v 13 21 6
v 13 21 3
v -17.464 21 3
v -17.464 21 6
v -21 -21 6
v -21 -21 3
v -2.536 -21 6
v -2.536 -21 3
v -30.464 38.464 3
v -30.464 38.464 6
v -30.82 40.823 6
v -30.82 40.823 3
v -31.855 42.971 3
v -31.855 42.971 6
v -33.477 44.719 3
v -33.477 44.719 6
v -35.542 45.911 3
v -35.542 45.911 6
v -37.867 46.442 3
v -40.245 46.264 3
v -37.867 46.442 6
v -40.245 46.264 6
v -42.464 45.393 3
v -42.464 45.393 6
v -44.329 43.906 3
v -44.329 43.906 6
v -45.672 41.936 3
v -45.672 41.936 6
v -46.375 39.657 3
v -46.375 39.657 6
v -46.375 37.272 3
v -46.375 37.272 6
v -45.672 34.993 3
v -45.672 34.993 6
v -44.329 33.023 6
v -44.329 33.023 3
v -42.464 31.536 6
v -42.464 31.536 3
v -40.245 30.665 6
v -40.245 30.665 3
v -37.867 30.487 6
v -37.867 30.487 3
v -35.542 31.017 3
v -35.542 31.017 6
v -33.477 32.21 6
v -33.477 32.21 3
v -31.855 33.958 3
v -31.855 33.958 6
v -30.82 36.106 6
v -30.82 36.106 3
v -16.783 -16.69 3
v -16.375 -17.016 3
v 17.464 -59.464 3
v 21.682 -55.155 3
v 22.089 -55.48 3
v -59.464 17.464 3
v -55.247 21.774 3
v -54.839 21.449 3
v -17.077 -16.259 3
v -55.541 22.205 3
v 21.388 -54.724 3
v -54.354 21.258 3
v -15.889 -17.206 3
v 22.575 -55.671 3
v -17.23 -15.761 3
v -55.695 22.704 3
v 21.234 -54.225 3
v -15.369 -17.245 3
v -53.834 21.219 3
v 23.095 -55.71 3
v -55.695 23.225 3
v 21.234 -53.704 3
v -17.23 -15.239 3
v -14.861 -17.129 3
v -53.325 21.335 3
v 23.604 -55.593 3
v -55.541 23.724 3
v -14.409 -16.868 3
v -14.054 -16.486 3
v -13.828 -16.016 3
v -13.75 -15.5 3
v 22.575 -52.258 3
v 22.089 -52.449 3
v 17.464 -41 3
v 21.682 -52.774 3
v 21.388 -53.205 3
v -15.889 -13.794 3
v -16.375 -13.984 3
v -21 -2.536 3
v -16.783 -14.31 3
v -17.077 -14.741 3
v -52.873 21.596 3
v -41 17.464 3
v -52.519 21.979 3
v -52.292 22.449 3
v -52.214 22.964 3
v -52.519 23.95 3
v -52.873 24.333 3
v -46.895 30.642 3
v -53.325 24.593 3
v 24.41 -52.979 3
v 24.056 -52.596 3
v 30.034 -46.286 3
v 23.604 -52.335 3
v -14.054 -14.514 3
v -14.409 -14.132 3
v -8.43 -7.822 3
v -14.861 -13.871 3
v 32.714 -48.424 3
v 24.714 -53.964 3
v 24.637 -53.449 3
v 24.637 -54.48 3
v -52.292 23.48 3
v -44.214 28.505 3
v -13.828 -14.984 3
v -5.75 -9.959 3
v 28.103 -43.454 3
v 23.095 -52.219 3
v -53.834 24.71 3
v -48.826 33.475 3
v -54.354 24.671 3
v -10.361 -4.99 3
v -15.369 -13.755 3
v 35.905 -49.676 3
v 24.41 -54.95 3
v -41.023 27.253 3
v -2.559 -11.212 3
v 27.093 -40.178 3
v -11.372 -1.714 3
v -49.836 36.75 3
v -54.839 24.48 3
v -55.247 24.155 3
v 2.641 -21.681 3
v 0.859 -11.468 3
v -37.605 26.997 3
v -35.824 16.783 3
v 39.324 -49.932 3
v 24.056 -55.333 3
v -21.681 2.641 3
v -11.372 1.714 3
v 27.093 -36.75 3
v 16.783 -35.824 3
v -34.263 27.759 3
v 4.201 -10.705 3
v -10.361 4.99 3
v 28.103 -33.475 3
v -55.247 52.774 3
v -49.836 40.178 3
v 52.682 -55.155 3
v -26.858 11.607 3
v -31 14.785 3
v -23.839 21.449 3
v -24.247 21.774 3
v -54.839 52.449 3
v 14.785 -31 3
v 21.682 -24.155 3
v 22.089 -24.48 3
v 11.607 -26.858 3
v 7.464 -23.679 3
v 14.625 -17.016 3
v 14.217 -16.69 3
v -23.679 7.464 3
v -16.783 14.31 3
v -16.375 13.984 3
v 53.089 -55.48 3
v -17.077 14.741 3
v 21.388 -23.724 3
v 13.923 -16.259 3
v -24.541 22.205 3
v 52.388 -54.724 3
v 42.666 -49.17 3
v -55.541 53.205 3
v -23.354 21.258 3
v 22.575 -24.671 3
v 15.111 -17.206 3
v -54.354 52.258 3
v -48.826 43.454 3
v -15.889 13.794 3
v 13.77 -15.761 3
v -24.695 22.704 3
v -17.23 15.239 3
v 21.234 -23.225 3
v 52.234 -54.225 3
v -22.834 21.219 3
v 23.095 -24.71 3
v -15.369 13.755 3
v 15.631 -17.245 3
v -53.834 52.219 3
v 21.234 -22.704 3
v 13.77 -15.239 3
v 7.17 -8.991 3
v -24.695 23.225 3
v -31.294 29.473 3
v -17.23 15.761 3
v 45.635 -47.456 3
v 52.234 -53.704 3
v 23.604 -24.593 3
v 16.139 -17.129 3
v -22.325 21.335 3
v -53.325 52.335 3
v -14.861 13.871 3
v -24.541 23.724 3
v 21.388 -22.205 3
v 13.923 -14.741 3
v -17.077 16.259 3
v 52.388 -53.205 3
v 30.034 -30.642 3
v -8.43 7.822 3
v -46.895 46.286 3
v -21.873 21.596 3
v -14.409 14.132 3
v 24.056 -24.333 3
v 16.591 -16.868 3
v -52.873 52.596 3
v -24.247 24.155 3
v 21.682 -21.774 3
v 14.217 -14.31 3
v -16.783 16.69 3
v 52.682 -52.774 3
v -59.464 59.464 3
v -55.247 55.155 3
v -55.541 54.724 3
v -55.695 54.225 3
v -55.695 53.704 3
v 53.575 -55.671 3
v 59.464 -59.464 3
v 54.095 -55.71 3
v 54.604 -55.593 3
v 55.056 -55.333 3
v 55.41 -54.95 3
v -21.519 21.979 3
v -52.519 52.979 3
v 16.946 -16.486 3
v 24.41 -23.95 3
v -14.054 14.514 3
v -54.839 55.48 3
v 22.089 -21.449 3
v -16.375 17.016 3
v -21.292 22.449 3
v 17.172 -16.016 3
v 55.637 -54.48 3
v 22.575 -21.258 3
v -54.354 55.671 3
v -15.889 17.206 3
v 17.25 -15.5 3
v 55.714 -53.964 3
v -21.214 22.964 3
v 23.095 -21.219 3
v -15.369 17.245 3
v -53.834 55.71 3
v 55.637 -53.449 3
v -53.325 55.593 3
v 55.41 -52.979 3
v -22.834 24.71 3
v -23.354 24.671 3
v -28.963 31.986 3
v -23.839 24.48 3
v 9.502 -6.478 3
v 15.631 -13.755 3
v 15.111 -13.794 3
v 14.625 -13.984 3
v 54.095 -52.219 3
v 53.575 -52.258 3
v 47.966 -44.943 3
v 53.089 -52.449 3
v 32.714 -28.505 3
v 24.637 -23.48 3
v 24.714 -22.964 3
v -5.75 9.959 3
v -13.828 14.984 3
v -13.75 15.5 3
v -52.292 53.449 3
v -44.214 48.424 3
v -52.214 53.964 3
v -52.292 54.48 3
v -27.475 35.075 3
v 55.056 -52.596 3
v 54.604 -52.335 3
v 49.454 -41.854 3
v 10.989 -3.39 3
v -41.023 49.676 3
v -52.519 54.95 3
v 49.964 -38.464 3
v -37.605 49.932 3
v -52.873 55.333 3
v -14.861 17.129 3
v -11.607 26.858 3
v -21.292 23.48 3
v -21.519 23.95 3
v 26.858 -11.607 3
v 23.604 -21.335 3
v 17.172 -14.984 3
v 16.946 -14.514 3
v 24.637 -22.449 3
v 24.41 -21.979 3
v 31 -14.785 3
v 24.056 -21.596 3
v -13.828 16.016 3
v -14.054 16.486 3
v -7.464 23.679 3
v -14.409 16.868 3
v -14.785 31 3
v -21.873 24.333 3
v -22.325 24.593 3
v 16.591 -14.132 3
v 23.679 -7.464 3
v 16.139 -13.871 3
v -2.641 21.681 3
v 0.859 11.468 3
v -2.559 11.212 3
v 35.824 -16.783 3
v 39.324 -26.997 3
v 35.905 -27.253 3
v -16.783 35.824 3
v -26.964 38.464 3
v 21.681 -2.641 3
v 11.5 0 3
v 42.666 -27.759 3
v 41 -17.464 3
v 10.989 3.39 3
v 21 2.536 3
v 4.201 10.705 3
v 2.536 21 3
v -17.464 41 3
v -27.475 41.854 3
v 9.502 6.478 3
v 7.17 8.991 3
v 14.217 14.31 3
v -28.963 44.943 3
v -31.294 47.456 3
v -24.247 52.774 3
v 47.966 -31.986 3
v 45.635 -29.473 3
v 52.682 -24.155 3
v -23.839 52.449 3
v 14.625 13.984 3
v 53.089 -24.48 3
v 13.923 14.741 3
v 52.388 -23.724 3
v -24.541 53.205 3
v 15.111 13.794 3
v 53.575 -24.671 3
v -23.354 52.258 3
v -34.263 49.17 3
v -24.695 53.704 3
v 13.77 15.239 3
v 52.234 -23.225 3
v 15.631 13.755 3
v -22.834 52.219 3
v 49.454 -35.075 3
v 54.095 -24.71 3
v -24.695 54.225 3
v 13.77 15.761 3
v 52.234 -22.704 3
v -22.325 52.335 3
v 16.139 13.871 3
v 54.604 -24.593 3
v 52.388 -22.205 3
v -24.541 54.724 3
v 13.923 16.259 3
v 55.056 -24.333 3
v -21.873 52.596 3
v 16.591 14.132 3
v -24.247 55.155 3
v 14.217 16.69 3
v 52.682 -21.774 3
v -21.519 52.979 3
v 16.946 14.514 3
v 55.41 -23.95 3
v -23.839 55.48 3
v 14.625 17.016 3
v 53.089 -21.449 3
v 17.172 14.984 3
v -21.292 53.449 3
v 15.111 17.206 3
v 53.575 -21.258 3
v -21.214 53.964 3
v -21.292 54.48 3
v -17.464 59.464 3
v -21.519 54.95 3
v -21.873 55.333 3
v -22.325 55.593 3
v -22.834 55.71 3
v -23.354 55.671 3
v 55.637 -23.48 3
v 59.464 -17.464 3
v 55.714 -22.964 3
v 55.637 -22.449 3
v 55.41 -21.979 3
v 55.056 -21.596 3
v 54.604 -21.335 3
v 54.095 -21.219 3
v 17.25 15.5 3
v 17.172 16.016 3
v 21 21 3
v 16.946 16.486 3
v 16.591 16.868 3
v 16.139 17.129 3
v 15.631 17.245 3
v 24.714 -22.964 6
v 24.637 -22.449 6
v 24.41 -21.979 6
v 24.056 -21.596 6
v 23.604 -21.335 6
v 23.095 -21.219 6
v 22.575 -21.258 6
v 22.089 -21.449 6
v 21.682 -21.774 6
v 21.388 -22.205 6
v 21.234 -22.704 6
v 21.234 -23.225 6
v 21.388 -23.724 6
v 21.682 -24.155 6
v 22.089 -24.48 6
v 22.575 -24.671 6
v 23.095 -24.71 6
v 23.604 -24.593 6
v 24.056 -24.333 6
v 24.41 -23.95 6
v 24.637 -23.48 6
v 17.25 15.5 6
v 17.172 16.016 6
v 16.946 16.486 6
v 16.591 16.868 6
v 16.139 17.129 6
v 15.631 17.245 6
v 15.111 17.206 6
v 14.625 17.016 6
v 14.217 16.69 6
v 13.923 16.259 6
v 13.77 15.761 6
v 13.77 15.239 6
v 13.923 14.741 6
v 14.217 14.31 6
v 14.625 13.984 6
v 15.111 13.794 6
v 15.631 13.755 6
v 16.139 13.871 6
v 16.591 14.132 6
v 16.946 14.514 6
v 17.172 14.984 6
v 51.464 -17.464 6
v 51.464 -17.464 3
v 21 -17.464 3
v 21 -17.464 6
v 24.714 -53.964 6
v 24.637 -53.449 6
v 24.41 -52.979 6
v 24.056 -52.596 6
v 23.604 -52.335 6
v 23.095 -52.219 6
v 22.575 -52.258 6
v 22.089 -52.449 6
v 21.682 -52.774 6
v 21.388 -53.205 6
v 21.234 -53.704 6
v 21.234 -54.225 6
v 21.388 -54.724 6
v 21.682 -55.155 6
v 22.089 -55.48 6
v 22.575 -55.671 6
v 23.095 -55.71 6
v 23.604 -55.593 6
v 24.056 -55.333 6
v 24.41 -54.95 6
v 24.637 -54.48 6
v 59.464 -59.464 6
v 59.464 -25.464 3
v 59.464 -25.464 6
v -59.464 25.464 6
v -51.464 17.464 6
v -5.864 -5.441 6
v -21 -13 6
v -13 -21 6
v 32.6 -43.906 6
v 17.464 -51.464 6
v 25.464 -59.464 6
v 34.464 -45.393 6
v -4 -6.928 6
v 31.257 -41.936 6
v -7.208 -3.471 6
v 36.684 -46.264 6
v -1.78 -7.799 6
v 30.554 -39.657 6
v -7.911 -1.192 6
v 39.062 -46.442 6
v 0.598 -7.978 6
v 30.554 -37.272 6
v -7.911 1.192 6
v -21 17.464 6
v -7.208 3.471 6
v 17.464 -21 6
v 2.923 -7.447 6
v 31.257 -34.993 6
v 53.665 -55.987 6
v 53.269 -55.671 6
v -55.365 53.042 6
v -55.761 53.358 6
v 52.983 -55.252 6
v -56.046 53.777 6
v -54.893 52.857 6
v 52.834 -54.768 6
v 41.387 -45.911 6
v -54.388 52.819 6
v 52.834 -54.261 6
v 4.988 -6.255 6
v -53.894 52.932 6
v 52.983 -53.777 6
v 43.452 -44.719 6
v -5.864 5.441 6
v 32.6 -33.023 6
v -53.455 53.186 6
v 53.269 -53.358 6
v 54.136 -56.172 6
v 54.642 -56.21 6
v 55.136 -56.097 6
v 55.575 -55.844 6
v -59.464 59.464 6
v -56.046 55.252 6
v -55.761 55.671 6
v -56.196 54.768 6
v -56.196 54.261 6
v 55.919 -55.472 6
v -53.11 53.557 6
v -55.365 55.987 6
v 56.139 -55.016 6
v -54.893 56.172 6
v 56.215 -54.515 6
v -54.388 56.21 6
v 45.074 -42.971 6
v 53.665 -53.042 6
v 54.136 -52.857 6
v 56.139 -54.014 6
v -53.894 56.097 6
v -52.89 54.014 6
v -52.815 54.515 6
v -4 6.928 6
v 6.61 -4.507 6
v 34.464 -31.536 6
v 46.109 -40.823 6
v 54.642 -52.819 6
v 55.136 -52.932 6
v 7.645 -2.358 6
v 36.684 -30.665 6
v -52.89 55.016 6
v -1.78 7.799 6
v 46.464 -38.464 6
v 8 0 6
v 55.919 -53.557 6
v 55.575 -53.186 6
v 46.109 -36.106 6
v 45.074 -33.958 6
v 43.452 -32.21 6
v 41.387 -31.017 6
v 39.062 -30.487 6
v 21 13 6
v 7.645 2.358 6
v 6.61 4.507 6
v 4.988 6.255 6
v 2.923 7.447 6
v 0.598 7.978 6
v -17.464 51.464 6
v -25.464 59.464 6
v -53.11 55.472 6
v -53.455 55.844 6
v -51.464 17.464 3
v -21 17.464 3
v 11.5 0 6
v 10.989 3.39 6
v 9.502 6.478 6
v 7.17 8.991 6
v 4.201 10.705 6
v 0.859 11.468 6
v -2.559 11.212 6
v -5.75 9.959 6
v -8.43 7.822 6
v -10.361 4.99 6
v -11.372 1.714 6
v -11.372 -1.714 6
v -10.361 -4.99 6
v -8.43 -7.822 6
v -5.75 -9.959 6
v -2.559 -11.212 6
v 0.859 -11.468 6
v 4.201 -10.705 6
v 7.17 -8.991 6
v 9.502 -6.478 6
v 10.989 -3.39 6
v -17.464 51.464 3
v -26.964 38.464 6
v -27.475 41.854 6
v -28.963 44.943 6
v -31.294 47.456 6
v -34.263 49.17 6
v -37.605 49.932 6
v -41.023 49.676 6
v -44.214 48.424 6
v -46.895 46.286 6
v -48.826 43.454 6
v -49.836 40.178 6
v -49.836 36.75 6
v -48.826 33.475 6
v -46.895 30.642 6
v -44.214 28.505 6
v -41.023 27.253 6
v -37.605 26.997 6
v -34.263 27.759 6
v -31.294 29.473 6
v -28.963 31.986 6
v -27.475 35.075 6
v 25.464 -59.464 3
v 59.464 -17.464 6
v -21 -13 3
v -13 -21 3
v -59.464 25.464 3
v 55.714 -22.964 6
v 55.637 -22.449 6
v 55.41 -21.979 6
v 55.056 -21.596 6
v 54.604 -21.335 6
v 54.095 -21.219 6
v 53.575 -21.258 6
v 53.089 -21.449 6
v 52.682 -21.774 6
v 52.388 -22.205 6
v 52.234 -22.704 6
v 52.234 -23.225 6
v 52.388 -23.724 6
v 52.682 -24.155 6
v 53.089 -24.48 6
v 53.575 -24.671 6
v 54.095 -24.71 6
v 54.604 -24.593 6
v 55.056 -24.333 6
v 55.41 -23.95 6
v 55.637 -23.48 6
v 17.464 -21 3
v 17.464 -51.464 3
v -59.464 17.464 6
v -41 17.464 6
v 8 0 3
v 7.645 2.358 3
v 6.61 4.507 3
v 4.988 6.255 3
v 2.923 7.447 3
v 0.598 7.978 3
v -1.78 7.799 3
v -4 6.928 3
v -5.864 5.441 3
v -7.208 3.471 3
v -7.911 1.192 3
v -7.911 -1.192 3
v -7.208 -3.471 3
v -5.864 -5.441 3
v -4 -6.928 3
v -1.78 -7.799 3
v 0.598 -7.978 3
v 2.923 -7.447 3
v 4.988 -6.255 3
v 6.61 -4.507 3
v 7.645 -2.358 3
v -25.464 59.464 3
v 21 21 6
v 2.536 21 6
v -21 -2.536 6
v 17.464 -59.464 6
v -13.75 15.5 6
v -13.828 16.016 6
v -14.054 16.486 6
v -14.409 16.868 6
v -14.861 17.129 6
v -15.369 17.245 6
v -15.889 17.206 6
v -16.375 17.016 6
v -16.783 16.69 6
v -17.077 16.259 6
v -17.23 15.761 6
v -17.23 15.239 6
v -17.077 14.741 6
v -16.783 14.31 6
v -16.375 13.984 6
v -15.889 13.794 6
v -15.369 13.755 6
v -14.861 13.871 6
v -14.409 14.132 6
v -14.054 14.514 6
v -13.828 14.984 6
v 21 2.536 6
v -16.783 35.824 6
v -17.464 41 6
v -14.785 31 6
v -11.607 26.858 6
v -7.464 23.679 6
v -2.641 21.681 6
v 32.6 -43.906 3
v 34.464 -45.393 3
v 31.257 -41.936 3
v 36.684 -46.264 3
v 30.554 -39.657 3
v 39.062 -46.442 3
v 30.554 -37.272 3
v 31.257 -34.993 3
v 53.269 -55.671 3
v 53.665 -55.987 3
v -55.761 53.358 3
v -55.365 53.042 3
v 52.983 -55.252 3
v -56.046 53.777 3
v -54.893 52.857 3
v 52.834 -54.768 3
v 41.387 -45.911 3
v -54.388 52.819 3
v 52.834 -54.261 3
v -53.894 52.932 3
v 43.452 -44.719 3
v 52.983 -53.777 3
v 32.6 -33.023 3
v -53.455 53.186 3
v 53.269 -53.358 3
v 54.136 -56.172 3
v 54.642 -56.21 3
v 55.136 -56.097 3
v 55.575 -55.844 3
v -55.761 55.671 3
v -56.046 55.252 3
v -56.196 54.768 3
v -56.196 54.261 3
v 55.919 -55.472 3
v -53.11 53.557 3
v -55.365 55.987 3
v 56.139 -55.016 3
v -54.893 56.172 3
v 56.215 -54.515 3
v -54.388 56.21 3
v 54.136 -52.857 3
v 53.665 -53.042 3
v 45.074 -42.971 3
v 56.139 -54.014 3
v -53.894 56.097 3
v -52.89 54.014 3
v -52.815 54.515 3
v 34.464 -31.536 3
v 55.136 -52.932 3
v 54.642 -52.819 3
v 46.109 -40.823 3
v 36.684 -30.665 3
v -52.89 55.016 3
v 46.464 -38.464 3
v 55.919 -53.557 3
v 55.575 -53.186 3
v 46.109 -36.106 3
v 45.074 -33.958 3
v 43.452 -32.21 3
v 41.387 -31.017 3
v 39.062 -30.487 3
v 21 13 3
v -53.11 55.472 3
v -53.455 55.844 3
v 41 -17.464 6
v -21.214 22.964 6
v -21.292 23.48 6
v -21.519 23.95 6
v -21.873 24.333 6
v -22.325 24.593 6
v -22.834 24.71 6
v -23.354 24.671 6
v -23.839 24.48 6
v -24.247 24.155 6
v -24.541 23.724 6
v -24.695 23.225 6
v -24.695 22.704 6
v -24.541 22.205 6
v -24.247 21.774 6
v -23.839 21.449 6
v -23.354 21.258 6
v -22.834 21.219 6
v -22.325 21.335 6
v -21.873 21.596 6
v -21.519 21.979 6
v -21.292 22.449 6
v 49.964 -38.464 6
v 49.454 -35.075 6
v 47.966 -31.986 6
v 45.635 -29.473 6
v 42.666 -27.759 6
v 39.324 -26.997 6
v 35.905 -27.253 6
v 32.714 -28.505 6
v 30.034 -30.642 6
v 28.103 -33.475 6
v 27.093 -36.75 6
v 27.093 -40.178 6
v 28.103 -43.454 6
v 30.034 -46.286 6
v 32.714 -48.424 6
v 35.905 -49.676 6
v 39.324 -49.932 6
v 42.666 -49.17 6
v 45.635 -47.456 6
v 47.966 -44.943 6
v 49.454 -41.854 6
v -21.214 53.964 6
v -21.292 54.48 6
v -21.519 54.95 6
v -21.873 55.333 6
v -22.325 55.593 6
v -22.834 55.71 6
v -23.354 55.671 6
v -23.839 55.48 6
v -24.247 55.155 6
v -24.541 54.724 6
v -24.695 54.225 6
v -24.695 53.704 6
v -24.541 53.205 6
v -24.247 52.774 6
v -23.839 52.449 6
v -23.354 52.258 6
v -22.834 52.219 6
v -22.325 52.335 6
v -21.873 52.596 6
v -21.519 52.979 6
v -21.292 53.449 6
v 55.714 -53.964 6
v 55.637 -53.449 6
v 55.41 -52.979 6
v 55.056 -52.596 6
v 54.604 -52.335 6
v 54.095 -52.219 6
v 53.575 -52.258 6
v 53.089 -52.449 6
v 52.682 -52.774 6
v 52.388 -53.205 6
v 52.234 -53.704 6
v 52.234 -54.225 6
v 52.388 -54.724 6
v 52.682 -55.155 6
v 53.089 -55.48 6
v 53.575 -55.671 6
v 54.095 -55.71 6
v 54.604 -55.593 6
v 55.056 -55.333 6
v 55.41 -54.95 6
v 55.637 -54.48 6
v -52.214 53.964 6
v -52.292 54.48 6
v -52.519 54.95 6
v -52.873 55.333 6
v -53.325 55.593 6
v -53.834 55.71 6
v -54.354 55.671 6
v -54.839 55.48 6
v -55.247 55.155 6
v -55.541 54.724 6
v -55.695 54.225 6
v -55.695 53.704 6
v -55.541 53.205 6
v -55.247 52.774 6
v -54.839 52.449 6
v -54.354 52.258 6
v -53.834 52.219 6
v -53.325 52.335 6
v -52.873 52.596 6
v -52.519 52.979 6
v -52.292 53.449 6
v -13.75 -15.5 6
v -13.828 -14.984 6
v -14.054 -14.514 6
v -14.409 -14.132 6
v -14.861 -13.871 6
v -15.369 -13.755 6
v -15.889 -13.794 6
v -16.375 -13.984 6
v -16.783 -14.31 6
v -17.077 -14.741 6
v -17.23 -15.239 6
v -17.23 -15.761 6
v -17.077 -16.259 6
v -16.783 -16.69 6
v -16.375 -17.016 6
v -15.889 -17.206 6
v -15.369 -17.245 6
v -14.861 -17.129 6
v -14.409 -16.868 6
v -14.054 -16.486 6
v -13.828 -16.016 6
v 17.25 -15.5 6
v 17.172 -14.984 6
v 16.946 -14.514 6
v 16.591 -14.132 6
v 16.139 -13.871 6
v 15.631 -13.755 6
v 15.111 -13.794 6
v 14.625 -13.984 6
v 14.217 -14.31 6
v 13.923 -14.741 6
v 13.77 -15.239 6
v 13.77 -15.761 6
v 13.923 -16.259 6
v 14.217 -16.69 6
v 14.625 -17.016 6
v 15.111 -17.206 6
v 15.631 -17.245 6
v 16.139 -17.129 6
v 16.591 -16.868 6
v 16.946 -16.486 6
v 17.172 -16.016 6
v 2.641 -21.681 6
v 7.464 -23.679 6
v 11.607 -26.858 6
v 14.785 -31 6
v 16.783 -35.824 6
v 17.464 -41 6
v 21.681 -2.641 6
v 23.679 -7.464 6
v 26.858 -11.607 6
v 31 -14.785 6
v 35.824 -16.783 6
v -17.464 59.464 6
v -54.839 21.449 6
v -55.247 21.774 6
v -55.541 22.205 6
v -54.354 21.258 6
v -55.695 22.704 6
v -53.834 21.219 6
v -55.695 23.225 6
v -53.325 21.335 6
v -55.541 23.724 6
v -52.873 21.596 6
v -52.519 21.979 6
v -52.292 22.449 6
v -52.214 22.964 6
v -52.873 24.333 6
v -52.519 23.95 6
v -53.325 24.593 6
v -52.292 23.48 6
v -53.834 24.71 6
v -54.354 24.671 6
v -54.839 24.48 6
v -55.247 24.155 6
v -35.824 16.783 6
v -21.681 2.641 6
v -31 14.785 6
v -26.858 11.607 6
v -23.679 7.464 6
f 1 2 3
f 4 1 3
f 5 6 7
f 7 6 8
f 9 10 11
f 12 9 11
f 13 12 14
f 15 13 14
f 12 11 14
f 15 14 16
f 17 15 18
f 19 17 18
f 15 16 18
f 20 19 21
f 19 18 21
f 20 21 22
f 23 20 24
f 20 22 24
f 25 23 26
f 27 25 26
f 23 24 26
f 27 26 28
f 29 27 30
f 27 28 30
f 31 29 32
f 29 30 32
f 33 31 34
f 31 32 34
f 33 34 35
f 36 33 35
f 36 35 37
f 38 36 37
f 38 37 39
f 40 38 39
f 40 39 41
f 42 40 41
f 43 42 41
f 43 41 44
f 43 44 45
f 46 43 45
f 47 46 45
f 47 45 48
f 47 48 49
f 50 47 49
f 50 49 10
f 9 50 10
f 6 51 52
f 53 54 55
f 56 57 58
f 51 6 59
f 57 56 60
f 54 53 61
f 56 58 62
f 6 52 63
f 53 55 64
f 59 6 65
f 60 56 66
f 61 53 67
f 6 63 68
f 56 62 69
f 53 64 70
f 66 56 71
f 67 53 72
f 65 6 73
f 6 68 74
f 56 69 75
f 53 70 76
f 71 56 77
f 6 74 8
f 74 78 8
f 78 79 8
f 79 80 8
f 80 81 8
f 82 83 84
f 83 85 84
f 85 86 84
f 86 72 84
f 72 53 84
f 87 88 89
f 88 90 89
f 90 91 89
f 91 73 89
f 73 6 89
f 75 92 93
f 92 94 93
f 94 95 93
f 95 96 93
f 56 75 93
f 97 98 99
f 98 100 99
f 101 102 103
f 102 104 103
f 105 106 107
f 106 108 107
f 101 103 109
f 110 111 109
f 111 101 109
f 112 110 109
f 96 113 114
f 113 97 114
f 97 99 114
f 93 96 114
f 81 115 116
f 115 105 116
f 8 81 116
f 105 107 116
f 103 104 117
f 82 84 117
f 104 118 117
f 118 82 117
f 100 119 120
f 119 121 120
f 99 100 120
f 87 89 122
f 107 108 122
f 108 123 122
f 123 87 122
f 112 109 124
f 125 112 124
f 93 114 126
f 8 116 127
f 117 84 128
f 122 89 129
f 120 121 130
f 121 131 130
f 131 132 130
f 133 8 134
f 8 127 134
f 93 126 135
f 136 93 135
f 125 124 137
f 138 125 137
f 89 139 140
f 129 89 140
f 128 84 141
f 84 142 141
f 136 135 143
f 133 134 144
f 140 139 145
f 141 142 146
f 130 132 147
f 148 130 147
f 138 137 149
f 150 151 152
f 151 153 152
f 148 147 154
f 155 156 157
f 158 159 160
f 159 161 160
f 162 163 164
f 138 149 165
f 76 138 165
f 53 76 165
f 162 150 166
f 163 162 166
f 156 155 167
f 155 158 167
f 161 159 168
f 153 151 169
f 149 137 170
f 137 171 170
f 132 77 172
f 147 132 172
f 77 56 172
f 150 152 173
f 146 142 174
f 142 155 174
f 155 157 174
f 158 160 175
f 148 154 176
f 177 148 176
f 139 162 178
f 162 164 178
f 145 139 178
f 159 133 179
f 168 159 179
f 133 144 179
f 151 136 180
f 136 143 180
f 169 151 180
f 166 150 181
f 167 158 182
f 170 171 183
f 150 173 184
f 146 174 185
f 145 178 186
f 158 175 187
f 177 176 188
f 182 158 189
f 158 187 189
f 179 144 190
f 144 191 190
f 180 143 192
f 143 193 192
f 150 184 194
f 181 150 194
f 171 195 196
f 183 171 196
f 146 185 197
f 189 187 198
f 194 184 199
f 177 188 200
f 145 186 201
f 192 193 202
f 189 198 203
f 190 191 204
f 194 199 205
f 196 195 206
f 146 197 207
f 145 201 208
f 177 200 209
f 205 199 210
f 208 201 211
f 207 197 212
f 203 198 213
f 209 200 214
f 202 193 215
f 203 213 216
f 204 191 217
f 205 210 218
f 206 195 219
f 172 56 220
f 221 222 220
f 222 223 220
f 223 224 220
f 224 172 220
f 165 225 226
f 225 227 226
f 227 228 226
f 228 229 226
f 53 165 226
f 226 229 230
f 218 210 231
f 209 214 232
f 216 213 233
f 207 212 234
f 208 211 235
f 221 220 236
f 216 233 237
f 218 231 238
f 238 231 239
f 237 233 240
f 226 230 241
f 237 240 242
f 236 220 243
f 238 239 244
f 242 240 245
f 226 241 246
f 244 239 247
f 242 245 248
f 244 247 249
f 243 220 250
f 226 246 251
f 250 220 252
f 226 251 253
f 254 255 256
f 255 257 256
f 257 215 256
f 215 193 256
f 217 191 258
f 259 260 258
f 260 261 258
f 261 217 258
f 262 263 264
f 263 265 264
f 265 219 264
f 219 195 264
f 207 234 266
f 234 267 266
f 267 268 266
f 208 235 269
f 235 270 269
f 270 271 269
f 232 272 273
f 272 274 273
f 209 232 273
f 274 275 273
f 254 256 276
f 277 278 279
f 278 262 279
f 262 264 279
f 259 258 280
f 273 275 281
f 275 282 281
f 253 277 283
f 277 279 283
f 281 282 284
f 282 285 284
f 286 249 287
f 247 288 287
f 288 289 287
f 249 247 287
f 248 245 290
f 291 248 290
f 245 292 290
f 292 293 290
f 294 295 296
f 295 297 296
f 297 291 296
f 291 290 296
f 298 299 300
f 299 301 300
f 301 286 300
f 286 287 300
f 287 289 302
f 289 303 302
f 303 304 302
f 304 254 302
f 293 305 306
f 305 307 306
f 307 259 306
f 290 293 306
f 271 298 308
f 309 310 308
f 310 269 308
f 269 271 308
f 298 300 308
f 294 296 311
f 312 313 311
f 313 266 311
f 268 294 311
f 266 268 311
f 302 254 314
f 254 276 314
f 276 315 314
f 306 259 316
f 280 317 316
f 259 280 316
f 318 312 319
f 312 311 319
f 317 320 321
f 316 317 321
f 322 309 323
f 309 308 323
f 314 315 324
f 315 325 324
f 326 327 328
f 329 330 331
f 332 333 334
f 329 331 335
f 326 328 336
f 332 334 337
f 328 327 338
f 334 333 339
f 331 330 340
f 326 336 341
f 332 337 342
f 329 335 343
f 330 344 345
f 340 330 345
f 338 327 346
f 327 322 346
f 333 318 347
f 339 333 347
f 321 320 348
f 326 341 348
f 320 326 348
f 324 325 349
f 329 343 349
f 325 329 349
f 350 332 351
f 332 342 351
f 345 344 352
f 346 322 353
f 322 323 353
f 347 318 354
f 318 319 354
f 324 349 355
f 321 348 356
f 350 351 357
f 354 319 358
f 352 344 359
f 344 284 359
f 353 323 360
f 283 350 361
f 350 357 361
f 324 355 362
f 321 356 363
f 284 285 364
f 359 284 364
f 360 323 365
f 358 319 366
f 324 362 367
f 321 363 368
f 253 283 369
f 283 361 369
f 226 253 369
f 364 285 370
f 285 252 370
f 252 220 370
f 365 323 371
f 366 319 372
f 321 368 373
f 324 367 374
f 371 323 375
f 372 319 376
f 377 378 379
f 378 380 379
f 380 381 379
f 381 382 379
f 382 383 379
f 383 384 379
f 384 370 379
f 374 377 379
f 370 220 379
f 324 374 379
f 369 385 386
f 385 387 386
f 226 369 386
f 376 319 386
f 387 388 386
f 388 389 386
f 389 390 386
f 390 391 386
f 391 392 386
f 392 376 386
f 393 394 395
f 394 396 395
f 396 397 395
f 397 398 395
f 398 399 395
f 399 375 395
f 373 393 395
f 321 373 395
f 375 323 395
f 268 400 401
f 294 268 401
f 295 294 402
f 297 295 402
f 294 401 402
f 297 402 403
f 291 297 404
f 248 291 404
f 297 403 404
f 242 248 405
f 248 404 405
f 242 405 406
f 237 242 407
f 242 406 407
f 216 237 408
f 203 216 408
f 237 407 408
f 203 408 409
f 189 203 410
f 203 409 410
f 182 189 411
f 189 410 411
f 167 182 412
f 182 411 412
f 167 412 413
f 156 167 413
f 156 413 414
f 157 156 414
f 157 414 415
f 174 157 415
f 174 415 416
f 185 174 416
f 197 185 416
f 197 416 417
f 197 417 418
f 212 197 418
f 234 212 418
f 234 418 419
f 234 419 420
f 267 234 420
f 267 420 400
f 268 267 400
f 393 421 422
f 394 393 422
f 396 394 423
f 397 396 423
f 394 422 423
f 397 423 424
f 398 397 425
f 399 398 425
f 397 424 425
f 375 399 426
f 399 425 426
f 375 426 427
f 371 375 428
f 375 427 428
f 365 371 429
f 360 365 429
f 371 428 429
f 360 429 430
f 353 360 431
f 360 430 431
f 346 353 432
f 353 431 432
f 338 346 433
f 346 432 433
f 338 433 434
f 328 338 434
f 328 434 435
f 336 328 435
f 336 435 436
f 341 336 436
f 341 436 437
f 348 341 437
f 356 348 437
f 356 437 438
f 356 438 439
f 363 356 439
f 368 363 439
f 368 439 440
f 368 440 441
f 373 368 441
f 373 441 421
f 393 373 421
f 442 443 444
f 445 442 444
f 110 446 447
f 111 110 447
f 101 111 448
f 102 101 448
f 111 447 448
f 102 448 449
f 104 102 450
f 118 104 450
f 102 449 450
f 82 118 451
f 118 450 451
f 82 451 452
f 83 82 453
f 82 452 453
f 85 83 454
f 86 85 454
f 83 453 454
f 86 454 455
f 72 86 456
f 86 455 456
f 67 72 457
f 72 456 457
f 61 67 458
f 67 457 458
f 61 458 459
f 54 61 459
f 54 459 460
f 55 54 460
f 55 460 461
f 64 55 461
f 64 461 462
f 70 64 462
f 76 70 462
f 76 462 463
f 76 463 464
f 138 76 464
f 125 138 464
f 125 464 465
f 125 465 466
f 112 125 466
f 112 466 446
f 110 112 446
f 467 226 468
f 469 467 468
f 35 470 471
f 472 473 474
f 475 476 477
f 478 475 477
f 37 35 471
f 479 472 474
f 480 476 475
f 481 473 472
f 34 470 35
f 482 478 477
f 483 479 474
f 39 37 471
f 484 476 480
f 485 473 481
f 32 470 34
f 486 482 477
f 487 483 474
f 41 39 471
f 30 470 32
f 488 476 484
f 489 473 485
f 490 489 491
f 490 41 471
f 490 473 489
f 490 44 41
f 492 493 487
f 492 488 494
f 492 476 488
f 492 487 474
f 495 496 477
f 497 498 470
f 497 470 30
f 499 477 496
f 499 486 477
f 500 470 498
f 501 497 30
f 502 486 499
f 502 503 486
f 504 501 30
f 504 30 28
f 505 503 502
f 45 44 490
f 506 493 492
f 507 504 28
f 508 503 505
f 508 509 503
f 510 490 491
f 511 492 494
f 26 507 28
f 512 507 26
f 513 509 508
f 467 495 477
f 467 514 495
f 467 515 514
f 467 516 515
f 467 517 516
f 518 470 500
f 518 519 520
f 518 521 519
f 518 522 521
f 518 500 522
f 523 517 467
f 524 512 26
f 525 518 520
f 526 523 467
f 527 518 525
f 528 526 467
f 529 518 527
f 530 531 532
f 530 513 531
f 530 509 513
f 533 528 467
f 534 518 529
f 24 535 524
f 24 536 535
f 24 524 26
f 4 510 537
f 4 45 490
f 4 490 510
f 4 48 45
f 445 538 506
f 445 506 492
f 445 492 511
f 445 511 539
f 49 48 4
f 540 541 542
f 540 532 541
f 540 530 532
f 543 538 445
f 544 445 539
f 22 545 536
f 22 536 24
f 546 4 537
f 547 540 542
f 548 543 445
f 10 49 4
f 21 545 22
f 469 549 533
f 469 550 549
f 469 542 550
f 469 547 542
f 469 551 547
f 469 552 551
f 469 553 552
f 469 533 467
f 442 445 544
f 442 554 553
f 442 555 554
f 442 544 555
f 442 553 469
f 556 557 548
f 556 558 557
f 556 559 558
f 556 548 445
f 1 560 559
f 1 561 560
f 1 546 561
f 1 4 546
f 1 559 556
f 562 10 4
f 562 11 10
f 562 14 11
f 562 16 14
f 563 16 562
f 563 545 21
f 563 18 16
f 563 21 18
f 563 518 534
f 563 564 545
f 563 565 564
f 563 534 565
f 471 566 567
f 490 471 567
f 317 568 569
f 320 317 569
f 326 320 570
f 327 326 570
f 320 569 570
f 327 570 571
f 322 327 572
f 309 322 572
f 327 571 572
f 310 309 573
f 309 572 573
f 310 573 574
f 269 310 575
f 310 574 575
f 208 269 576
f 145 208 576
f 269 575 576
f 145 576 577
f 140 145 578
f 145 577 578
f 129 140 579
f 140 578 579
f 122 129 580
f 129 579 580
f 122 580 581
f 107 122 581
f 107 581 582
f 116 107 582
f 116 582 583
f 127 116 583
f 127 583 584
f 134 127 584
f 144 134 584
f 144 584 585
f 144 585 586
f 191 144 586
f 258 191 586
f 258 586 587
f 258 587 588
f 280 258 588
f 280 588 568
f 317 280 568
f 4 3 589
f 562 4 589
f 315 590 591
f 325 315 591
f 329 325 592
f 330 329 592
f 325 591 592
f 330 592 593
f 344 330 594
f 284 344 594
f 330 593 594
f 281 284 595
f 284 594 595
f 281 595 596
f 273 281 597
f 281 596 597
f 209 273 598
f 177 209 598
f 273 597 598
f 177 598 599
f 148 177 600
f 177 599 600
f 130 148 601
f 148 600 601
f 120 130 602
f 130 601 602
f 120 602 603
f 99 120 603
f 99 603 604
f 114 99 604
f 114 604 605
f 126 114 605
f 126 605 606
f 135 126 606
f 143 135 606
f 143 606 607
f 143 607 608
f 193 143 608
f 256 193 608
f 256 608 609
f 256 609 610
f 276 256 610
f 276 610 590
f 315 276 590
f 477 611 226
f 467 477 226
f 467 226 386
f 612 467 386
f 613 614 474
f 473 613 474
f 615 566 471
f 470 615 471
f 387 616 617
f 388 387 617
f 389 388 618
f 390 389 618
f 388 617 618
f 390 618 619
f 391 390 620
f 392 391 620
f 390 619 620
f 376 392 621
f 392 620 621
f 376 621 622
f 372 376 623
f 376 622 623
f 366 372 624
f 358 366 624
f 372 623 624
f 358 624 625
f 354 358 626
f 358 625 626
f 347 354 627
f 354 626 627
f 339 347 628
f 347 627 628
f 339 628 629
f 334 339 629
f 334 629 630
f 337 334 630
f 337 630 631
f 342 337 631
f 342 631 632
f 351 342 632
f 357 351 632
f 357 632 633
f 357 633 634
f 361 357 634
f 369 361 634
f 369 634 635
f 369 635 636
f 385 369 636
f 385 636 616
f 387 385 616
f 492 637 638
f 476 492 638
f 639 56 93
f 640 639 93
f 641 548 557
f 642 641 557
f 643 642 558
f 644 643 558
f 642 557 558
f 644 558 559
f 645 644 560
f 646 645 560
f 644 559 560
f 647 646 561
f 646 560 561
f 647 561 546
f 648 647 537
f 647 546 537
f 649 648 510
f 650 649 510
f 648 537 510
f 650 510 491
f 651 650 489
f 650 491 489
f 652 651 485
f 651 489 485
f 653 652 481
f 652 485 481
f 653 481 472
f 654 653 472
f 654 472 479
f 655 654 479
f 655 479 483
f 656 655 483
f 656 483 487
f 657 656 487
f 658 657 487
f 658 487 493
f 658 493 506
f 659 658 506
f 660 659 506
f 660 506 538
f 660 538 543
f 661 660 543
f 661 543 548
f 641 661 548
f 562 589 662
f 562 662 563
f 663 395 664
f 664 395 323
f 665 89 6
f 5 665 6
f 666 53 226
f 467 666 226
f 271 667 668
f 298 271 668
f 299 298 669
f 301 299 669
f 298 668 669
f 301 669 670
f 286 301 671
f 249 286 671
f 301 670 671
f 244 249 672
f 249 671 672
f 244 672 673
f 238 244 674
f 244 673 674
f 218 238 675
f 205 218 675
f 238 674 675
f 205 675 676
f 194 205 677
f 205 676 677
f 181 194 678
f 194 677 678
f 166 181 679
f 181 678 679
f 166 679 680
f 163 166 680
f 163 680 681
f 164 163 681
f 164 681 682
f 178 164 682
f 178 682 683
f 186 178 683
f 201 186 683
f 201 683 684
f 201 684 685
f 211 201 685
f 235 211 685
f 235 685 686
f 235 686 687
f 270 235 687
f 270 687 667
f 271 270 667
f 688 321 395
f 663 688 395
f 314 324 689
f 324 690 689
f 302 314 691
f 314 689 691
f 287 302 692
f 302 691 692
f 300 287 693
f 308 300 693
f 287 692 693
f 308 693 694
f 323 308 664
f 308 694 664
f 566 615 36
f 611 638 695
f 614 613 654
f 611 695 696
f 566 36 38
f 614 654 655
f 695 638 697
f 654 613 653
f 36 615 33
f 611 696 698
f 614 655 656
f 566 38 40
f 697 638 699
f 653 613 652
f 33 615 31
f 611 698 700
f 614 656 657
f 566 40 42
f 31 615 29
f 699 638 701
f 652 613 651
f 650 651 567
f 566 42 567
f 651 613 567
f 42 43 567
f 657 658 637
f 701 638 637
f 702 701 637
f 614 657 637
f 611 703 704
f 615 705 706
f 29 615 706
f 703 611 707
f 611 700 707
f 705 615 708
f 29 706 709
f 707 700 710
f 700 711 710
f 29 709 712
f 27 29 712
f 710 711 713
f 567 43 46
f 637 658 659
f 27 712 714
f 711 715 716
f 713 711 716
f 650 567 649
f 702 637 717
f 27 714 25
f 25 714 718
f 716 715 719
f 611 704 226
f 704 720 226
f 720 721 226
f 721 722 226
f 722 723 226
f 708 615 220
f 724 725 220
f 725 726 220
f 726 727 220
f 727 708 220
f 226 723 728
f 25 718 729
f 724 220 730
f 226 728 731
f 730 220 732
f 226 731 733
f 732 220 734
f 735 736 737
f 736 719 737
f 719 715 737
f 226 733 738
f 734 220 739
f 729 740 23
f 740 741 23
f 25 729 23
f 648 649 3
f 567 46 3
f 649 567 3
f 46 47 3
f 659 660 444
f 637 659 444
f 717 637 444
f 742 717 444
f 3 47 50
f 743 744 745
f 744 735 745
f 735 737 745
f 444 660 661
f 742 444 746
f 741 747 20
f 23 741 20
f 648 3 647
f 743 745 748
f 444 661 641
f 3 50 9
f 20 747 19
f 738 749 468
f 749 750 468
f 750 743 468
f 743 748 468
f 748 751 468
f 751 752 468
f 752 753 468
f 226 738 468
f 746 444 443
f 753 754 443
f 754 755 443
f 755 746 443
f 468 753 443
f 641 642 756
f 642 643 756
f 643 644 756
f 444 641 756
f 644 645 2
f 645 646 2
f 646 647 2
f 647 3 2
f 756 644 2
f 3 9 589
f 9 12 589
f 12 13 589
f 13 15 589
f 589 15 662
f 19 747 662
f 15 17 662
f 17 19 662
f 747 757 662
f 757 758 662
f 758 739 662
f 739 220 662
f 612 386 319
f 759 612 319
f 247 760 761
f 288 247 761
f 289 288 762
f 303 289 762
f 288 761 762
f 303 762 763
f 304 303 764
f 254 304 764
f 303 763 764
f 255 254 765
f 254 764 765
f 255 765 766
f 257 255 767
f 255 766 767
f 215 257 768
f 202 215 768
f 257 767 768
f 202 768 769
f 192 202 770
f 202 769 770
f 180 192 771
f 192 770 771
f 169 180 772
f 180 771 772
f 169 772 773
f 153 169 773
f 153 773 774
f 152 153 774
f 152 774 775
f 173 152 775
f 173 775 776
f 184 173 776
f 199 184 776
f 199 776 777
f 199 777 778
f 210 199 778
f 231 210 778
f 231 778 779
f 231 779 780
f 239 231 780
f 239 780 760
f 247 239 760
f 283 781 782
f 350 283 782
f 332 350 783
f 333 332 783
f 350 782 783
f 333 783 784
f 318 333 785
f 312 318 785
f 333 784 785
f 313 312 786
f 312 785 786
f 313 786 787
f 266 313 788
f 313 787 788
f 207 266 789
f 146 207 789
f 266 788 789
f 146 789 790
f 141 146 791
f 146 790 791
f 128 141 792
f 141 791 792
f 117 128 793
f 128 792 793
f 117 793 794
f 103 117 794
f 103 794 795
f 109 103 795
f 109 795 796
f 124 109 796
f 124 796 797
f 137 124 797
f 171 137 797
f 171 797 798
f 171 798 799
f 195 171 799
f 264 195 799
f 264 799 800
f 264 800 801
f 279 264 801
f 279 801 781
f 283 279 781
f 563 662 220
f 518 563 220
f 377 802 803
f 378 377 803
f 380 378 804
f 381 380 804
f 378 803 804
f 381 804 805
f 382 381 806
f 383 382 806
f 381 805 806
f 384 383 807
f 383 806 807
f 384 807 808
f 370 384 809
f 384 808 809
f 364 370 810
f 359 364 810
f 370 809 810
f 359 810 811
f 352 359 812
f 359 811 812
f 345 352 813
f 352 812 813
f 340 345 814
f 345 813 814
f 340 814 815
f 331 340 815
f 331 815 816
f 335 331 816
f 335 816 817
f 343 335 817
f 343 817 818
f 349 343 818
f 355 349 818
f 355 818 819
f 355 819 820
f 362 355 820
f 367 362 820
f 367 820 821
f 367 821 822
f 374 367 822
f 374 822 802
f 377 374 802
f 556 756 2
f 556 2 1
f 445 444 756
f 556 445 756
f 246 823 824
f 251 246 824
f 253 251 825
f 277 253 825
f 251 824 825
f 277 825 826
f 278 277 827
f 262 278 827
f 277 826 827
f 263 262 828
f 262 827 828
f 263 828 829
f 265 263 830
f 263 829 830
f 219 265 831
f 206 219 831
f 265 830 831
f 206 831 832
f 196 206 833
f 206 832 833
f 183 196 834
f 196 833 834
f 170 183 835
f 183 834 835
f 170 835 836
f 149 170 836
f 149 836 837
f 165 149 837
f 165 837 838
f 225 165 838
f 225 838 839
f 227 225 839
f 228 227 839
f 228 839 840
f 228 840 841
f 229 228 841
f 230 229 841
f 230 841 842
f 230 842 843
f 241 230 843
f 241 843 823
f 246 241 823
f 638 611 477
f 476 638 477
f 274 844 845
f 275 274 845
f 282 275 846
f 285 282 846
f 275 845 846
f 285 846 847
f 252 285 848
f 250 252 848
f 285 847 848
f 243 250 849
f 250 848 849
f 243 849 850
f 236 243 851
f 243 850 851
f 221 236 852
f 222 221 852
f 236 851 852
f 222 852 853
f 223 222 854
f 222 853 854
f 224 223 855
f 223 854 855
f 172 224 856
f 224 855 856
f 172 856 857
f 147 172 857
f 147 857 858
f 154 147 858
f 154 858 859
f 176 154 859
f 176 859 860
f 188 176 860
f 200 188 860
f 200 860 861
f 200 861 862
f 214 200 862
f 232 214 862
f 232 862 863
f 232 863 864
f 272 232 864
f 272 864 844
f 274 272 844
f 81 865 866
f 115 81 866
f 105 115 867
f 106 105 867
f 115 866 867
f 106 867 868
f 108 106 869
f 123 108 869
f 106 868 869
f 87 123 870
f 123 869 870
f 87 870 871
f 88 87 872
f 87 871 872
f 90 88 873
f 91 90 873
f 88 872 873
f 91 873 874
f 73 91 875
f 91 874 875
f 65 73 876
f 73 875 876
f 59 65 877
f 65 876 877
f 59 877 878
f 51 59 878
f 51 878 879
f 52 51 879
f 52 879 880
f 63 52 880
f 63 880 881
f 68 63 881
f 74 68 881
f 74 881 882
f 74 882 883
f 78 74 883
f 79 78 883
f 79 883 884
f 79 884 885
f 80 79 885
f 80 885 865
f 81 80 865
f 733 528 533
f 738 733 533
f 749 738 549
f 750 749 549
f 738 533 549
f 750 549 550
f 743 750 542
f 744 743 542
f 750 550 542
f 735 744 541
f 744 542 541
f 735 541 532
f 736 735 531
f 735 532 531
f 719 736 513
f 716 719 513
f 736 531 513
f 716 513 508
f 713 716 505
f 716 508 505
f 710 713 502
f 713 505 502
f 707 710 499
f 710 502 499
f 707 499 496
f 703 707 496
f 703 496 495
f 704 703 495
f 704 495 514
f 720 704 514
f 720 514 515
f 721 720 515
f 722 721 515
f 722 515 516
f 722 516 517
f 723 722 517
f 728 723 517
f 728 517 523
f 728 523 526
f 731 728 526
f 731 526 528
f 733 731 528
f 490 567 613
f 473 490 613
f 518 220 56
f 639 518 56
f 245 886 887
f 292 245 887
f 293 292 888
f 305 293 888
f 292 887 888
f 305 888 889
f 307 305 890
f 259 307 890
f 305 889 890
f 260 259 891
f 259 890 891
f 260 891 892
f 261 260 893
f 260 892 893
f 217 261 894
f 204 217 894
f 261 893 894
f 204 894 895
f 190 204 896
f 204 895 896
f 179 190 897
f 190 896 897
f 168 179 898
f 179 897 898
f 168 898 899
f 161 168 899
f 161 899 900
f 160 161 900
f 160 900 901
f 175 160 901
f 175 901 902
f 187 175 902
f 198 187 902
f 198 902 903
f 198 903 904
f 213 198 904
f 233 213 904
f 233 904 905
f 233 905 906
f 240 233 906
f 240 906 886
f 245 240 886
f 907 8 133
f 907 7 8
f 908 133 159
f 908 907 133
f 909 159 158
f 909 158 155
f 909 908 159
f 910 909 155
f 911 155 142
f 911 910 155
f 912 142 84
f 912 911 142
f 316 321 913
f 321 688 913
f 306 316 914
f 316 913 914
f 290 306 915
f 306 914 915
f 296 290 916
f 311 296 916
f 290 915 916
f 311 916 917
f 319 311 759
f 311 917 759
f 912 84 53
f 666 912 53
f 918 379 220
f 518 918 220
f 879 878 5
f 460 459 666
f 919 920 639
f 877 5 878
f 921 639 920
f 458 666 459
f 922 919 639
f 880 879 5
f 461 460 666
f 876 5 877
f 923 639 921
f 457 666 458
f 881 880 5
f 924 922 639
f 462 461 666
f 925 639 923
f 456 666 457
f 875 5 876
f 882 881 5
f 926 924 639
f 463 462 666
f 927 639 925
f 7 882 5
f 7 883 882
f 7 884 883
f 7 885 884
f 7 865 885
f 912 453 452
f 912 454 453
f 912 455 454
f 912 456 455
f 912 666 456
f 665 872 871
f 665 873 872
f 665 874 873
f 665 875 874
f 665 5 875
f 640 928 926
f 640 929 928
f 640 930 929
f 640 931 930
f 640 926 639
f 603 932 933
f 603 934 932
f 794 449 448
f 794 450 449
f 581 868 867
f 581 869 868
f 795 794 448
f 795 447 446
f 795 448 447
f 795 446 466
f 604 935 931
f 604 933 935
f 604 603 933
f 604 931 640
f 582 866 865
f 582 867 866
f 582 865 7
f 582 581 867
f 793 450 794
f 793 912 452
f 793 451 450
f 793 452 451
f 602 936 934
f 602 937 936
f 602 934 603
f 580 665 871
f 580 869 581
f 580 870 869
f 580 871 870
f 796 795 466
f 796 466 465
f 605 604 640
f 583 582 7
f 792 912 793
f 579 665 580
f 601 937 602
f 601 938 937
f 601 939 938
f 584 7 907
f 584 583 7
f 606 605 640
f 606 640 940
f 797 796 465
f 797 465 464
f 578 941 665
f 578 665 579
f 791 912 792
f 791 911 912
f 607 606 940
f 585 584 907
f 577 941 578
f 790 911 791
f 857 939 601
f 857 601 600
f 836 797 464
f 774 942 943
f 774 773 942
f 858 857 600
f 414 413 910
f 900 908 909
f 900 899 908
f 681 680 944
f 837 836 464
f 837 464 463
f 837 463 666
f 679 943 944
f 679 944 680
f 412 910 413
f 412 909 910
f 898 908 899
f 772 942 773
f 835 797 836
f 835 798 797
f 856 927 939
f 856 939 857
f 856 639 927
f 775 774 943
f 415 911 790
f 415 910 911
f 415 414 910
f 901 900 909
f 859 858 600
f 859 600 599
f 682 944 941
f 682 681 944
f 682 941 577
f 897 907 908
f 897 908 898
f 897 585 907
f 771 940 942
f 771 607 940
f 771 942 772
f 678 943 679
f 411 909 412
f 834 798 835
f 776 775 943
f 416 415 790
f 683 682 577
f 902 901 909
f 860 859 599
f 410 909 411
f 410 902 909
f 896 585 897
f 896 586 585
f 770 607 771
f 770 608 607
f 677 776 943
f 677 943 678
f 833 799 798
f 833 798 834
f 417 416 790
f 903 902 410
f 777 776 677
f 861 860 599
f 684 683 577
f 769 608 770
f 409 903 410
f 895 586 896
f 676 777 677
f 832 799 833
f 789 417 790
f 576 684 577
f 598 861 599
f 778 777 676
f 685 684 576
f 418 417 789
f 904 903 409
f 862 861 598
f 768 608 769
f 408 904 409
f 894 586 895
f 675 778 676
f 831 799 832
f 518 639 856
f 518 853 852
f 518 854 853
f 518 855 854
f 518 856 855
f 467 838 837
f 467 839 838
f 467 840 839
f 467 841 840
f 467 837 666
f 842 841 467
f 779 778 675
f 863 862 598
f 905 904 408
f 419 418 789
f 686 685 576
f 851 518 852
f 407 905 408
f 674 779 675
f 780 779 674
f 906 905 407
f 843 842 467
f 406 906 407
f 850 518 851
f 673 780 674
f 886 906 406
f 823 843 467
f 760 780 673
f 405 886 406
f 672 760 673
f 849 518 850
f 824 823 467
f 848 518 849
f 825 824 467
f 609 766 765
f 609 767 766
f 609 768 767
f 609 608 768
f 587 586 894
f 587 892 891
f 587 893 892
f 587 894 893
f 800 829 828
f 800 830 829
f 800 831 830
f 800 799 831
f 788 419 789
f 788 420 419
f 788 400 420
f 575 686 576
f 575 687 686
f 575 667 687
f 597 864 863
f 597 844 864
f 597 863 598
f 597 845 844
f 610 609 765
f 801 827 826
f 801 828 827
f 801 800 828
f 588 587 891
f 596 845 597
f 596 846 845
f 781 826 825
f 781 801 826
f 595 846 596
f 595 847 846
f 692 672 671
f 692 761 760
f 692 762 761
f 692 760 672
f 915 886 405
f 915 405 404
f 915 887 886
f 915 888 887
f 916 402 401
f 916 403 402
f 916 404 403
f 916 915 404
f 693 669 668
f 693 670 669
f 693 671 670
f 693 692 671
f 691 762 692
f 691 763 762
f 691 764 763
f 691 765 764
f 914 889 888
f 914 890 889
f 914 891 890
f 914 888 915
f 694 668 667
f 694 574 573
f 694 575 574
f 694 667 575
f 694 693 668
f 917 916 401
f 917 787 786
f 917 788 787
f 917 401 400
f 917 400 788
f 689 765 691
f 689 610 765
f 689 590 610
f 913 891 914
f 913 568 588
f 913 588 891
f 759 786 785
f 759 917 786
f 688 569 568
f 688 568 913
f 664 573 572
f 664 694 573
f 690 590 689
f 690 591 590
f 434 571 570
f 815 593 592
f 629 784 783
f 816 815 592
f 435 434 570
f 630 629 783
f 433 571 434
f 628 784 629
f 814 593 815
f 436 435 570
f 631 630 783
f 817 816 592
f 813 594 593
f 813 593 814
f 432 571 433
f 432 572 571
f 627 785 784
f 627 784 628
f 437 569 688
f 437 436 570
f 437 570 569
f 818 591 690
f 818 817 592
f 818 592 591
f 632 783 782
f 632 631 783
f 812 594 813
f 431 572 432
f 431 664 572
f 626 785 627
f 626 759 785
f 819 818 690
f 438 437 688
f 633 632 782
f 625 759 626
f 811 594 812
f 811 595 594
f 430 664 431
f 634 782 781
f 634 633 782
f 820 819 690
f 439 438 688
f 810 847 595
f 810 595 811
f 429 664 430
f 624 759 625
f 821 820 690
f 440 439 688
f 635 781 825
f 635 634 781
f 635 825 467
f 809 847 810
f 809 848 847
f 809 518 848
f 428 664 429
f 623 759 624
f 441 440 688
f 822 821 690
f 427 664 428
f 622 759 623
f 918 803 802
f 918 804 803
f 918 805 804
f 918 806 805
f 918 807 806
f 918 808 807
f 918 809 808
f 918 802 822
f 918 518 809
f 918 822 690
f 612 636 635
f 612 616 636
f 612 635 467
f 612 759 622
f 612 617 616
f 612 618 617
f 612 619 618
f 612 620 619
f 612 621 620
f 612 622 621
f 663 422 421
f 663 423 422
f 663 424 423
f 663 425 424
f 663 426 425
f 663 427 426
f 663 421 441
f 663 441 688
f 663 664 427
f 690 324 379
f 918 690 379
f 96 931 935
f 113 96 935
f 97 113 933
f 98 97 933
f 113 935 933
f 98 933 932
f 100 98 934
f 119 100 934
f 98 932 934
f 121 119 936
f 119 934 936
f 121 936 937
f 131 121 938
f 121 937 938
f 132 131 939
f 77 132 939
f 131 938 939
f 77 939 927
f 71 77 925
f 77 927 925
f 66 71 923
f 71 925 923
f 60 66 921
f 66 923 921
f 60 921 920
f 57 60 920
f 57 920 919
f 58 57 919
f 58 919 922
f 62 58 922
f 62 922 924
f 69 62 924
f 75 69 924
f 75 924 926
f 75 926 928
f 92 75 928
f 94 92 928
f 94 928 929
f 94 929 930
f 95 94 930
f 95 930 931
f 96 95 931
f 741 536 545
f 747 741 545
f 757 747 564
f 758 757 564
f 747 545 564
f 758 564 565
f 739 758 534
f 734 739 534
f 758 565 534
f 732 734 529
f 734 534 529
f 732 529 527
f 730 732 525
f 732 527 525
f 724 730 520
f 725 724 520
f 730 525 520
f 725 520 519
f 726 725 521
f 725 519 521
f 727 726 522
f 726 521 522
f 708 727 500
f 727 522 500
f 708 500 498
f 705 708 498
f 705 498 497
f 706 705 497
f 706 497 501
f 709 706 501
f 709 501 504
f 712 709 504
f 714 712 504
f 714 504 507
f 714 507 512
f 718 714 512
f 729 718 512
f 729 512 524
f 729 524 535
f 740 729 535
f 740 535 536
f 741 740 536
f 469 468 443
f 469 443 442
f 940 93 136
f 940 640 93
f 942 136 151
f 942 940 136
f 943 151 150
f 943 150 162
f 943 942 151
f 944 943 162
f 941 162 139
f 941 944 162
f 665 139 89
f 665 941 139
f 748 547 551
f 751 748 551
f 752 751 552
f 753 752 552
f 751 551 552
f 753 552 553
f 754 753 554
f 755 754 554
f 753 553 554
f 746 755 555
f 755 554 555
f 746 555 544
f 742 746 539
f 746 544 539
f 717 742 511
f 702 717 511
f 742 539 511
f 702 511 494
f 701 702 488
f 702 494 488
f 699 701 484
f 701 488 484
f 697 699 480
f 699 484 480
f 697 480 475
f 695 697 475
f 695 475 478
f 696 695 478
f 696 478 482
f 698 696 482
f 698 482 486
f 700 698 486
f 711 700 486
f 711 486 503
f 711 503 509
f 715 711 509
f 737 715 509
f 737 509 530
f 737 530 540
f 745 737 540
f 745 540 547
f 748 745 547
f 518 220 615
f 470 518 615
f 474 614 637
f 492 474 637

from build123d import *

# Parameters (mm, degrees)
PAD_DEPTH       = 3
SKETCH001_R     = 11.5
SKETCH001_R_2   = 1.75
POCKET_DEPTH    = 3.001
FILLET_R        = 20
PAD001_DEPTH    = 3
SKETCH002_R     = 8
SKETCH002_R_2   = 1.7
POCKET001_DEPTH = 3.001
CHAMFER_SIZE    = 8


with BuildPart() as body:
    # Sketch → Pad (new body)
    with BuildSketch(Plane.XY.offset(3)):
        Polygon((-59.464466, 59.464466), (-59.464466, 17.464466), (-21, 17.464466), (-21, -21), (17.464466, -21), (17.464466, -59.464466), (59.464466, -59.464466), (59.464466, -17.464466), (21, -17.464466), (21, 21), (-17.464466, 21), (-17.464466, 59.464466), align=None)
    extrude(amount=PAD_DEPTH)

    # Sketch001 (on Face14 of Pad) → Pocket (cut, through all)
    with BuildSketch(Plane.XY.offset(6)):
        with Locations((-38.464466, 38.464466)):
            Circle(SKETCH001_R)
        Circle(SKETCH001_R)
        with Locations((38.464466, -38.464466)):
            Circle(SKETCH001_R)
        with Locations((53.964466, -22.964466)):
            Circle(SKETCH001_R_2)
        with Locations((53.964466, -53.964466)):
            Circle(SKETCH001_R_2)
        with Locations((22.964466, -53.964466)):
            Circle(SKETCH001_R_2)
        with Locations((22.964466, -22.964466)):
            Circle(SKETCH001_R_2)
        with Locations((15.5, -15.5)):
            Circle(SKETCH001_R_2)
        with Locations((15.5, 15.5)):
            Circle(SKETCH001_R_2)
        with Locations((-15.5, 15.5)):
            Circle(SKETCH001_R_2)
        with Locations((-15.5, -15.5)):
            Circle(SKETCH001_R_2)
        with Locations((-22.964466, 22.964466)):
            Circle(SKETCH001_R_2)
        with Locations((-53.964466, 22.964466)):
            Circle(SKETCH001_R_2)
        with Locations((-53.964466, 53.964466)):
            Circle(SKETCH001_R_2)
        with Locations((-22.964466, 53.964466)):
            Circle(SKETCH001_R_2)
    extrude(amount=-POCKET_DEPTH, mode=Mode.SUBTRACT)

    # Fillet
    fillet_edges = [body.edges().sort_by_distance(p)[0] for p in [
        (-21, 17.464466, 4.5),
        (-17.464466, 21, 4.5),
        (21, -17.464466, 4.5),
        (17.464466, -21, 4.5),
    ]]
    fillet(fillet_edges, radius=FILLET_R)


with BuildPart() as holes:
    # Sketch003 → Pad001 (new body)
    with BuildSketch(Plane.XY.offset(3)):
        Polygon((-59.464466, 59.464466), (-59.464466, 17.464466), (-21, 17.464466), (-21, -21), (17.464466, -21), (17.464466, -59.464466), (59.464466, -59.464466), (59.464466, -17.464466), (21, -17.464466), (21, 21), (-17.464466, 21), (-17.464466, 59.464466), align=None)
    extrude(amount=PAD001_DEPTH)

    # Sketch002 (on Face14 of Pad001) → Pocket001 (cut, through all)
    with BuildSketch(Plane.XY.offset(6)):
        with Locations((-38.464466, 38.464466)):
            Circle(SKETCH002_R)
        Circle(SKETCH002_R)
        with Locations((38.464466, -38.464466)):
            Circle(SKETCH002_R)
        with Locations((-54.514719, 54.514719)):
            Circle(SKETCH002_R_2)
        with Locations((54.514719, -54.514719)):
            Circle(SKETCH002_R_2)
    extrude(amount=-POCKET001_DEPTH, mode=Mode.SUBTRACT)

    # Chamfer
    chamfer_edges = [holes.edges().sort_by_distance(p)[0] for p in [
        (-17.464466, 59.464466, 4.5),
        (21, 21, 4.5),
        (59.464466, -17.464466, 4.5),
        (-59.464466, 17.464466, 4.5),
        (-21, -21, 4.5),
        (17.464466, -59.464466, 4.5),
    ]]
    chamfer(chamfer_edges, length=CHAMFER_SIZE)


solid = Compound([body.part, holes.part])
